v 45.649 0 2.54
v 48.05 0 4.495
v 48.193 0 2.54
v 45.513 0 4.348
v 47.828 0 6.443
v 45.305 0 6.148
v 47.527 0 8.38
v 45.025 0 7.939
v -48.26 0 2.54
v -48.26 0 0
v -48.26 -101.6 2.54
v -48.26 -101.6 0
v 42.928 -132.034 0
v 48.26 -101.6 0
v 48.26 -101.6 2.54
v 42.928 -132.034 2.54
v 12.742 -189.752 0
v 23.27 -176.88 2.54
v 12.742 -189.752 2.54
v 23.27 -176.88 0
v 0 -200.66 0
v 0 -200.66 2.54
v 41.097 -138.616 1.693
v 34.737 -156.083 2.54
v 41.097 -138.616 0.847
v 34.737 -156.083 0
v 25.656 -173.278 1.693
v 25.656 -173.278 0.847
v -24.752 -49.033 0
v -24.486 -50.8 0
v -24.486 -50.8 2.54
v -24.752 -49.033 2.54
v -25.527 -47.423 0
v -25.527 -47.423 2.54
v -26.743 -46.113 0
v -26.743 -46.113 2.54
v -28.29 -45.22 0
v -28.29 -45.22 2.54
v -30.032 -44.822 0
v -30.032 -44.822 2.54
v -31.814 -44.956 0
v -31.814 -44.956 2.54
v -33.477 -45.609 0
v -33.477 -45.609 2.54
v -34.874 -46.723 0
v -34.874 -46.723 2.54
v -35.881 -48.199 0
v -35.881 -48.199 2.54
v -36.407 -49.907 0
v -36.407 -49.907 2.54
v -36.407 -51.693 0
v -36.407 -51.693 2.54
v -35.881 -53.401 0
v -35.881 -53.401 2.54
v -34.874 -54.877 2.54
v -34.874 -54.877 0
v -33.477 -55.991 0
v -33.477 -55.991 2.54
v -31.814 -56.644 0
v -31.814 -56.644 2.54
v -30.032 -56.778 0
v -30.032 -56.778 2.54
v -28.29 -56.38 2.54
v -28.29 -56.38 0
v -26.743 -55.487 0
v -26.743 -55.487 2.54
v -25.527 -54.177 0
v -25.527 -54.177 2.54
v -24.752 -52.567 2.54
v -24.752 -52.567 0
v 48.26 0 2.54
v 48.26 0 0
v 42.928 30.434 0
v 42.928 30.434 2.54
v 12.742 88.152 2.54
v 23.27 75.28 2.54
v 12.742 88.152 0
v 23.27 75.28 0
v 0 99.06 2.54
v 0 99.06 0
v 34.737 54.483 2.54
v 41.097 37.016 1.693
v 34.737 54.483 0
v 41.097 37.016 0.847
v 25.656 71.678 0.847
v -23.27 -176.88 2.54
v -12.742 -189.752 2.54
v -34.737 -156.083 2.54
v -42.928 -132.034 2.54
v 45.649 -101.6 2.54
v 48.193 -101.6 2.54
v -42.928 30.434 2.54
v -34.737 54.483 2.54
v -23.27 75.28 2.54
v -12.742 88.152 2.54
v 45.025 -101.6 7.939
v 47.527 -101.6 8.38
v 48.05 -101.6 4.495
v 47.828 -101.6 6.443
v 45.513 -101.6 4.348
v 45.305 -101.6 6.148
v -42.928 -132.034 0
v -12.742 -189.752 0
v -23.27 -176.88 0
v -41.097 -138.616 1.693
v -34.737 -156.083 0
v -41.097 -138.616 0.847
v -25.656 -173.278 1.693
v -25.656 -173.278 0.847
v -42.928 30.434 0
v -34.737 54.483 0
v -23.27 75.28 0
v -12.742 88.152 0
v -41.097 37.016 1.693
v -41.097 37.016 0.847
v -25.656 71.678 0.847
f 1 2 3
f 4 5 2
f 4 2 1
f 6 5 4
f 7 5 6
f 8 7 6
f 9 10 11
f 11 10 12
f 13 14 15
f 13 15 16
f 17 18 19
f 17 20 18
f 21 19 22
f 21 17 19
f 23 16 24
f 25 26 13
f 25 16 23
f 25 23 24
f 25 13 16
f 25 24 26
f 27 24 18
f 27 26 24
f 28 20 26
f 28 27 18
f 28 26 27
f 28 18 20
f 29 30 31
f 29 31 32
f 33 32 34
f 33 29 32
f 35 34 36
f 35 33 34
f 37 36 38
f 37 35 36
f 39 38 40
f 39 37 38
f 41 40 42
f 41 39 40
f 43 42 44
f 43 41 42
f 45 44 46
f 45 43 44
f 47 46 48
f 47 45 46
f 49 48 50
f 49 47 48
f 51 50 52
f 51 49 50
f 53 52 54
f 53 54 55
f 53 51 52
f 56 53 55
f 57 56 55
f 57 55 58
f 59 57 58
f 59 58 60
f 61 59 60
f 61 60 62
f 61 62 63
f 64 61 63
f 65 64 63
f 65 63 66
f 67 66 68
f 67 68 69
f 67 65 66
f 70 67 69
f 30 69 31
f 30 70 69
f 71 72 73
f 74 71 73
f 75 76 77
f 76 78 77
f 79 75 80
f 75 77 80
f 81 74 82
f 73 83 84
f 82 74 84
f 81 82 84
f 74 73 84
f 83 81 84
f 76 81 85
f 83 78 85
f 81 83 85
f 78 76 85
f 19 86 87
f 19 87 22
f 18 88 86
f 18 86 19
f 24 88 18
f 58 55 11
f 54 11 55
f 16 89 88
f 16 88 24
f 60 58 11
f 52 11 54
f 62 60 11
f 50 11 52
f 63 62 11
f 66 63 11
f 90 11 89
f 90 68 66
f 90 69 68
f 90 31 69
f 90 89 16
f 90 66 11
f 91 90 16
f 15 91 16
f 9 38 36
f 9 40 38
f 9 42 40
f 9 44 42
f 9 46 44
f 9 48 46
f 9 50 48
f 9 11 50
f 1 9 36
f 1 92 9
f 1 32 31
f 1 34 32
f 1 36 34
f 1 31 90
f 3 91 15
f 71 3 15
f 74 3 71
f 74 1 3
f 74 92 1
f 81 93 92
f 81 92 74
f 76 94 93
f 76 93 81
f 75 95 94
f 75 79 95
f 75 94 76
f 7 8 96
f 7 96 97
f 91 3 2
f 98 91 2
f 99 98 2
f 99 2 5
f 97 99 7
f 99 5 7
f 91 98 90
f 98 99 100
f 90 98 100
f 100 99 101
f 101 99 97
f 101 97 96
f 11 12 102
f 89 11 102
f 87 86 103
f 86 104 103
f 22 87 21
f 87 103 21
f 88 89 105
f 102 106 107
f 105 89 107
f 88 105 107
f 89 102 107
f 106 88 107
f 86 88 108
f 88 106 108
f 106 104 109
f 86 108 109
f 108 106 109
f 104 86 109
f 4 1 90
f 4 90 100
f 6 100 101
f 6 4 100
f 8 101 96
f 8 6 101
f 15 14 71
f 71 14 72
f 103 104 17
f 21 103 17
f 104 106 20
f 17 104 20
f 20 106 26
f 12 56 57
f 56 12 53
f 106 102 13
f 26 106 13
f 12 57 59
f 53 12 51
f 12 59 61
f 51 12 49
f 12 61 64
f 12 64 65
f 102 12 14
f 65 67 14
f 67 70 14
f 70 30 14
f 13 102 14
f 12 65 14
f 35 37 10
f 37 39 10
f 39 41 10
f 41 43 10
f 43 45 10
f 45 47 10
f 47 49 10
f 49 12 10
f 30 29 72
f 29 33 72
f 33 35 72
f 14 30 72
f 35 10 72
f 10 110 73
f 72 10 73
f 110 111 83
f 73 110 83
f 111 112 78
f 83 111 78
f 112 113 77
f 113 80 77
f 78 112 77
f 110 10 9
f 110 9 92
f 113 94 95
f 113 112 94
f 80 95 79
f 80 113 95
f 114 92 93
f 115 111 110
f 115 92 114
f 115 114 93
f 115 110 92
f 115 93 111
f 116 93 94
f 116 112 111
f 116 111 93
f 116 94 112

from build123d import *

# Parameters (mm, degrees)
SKETCH1_R           = 5.9944
BOSS_EXTRUDE1_DEPTH = 2.54
SKETCH1_5_W         = 2.54
SKETCH1_5_H         = 101.6
REVOLVE3_ANGLE      = 10


with BuildPart() as part:
    # Sketch1 → Boss-Extrude1 (new body)
    with BuildSketch(Plane.XY):
        with BuildLine():
            Line((-48.26, 0), (-48.26, -101.6))
            add(Edge.make_bspline(
                [(-48.26, -101.6), (-44.589659251, -138.15139004), (-31.409290844, -178.560823803), (0, -200.66)],
                knots=[0, 0, 0, 0, 1, 1, 1, 1], degree=3))
            add(Edge.make_bspline(
                [(48.26, -101.6), (44.589659251, -138.15139004), (31.409290844, -178.560823803), (0, -200.66)],
                knots=[0, 0, 0, 0, 1, 1, 1, 1], degree=3))
            Line((48.26, -101.6), (48.26, 0))
            add(Edge.make_bspline(
                [(48.26, 0), (44.589659251, 36.55139004), (31.409290844, 76.960823803), (0, 99.06)],
                knots=[0, 0, 0, 0, 1, 1, 1, 1], degree=3))
            add(Edge.make_bspline(
                [(-48.26, 0), (-44.589659251, 36.55139004), (-31.409290844, 76.960823803), (0, 99.06)],
                knots=[0, 0, 0, 0, 1, 1, 1, 1], degree=3))
        make_face()
        with Locations((-30.48, -50.8)):
            Circle(SKETCH1_R, mode=Mode.SUBTRACT)
    extrude(amount=BOSS_EXTRUDE1_DEPTH)

    # Sketch1<5> → Revolve3 (revolve)
    with BuildSketch(Plane.XY):
        with Locations((46.99, -50.8)):
            Rectangle(SKETCH1_5_W, SKETCH1_5_H)
    revolve(axis=Axis((0, 0, 0), (0, -1, 0)), revolution_arc=REVOLVE3_ANGLE)


solid = part.part
